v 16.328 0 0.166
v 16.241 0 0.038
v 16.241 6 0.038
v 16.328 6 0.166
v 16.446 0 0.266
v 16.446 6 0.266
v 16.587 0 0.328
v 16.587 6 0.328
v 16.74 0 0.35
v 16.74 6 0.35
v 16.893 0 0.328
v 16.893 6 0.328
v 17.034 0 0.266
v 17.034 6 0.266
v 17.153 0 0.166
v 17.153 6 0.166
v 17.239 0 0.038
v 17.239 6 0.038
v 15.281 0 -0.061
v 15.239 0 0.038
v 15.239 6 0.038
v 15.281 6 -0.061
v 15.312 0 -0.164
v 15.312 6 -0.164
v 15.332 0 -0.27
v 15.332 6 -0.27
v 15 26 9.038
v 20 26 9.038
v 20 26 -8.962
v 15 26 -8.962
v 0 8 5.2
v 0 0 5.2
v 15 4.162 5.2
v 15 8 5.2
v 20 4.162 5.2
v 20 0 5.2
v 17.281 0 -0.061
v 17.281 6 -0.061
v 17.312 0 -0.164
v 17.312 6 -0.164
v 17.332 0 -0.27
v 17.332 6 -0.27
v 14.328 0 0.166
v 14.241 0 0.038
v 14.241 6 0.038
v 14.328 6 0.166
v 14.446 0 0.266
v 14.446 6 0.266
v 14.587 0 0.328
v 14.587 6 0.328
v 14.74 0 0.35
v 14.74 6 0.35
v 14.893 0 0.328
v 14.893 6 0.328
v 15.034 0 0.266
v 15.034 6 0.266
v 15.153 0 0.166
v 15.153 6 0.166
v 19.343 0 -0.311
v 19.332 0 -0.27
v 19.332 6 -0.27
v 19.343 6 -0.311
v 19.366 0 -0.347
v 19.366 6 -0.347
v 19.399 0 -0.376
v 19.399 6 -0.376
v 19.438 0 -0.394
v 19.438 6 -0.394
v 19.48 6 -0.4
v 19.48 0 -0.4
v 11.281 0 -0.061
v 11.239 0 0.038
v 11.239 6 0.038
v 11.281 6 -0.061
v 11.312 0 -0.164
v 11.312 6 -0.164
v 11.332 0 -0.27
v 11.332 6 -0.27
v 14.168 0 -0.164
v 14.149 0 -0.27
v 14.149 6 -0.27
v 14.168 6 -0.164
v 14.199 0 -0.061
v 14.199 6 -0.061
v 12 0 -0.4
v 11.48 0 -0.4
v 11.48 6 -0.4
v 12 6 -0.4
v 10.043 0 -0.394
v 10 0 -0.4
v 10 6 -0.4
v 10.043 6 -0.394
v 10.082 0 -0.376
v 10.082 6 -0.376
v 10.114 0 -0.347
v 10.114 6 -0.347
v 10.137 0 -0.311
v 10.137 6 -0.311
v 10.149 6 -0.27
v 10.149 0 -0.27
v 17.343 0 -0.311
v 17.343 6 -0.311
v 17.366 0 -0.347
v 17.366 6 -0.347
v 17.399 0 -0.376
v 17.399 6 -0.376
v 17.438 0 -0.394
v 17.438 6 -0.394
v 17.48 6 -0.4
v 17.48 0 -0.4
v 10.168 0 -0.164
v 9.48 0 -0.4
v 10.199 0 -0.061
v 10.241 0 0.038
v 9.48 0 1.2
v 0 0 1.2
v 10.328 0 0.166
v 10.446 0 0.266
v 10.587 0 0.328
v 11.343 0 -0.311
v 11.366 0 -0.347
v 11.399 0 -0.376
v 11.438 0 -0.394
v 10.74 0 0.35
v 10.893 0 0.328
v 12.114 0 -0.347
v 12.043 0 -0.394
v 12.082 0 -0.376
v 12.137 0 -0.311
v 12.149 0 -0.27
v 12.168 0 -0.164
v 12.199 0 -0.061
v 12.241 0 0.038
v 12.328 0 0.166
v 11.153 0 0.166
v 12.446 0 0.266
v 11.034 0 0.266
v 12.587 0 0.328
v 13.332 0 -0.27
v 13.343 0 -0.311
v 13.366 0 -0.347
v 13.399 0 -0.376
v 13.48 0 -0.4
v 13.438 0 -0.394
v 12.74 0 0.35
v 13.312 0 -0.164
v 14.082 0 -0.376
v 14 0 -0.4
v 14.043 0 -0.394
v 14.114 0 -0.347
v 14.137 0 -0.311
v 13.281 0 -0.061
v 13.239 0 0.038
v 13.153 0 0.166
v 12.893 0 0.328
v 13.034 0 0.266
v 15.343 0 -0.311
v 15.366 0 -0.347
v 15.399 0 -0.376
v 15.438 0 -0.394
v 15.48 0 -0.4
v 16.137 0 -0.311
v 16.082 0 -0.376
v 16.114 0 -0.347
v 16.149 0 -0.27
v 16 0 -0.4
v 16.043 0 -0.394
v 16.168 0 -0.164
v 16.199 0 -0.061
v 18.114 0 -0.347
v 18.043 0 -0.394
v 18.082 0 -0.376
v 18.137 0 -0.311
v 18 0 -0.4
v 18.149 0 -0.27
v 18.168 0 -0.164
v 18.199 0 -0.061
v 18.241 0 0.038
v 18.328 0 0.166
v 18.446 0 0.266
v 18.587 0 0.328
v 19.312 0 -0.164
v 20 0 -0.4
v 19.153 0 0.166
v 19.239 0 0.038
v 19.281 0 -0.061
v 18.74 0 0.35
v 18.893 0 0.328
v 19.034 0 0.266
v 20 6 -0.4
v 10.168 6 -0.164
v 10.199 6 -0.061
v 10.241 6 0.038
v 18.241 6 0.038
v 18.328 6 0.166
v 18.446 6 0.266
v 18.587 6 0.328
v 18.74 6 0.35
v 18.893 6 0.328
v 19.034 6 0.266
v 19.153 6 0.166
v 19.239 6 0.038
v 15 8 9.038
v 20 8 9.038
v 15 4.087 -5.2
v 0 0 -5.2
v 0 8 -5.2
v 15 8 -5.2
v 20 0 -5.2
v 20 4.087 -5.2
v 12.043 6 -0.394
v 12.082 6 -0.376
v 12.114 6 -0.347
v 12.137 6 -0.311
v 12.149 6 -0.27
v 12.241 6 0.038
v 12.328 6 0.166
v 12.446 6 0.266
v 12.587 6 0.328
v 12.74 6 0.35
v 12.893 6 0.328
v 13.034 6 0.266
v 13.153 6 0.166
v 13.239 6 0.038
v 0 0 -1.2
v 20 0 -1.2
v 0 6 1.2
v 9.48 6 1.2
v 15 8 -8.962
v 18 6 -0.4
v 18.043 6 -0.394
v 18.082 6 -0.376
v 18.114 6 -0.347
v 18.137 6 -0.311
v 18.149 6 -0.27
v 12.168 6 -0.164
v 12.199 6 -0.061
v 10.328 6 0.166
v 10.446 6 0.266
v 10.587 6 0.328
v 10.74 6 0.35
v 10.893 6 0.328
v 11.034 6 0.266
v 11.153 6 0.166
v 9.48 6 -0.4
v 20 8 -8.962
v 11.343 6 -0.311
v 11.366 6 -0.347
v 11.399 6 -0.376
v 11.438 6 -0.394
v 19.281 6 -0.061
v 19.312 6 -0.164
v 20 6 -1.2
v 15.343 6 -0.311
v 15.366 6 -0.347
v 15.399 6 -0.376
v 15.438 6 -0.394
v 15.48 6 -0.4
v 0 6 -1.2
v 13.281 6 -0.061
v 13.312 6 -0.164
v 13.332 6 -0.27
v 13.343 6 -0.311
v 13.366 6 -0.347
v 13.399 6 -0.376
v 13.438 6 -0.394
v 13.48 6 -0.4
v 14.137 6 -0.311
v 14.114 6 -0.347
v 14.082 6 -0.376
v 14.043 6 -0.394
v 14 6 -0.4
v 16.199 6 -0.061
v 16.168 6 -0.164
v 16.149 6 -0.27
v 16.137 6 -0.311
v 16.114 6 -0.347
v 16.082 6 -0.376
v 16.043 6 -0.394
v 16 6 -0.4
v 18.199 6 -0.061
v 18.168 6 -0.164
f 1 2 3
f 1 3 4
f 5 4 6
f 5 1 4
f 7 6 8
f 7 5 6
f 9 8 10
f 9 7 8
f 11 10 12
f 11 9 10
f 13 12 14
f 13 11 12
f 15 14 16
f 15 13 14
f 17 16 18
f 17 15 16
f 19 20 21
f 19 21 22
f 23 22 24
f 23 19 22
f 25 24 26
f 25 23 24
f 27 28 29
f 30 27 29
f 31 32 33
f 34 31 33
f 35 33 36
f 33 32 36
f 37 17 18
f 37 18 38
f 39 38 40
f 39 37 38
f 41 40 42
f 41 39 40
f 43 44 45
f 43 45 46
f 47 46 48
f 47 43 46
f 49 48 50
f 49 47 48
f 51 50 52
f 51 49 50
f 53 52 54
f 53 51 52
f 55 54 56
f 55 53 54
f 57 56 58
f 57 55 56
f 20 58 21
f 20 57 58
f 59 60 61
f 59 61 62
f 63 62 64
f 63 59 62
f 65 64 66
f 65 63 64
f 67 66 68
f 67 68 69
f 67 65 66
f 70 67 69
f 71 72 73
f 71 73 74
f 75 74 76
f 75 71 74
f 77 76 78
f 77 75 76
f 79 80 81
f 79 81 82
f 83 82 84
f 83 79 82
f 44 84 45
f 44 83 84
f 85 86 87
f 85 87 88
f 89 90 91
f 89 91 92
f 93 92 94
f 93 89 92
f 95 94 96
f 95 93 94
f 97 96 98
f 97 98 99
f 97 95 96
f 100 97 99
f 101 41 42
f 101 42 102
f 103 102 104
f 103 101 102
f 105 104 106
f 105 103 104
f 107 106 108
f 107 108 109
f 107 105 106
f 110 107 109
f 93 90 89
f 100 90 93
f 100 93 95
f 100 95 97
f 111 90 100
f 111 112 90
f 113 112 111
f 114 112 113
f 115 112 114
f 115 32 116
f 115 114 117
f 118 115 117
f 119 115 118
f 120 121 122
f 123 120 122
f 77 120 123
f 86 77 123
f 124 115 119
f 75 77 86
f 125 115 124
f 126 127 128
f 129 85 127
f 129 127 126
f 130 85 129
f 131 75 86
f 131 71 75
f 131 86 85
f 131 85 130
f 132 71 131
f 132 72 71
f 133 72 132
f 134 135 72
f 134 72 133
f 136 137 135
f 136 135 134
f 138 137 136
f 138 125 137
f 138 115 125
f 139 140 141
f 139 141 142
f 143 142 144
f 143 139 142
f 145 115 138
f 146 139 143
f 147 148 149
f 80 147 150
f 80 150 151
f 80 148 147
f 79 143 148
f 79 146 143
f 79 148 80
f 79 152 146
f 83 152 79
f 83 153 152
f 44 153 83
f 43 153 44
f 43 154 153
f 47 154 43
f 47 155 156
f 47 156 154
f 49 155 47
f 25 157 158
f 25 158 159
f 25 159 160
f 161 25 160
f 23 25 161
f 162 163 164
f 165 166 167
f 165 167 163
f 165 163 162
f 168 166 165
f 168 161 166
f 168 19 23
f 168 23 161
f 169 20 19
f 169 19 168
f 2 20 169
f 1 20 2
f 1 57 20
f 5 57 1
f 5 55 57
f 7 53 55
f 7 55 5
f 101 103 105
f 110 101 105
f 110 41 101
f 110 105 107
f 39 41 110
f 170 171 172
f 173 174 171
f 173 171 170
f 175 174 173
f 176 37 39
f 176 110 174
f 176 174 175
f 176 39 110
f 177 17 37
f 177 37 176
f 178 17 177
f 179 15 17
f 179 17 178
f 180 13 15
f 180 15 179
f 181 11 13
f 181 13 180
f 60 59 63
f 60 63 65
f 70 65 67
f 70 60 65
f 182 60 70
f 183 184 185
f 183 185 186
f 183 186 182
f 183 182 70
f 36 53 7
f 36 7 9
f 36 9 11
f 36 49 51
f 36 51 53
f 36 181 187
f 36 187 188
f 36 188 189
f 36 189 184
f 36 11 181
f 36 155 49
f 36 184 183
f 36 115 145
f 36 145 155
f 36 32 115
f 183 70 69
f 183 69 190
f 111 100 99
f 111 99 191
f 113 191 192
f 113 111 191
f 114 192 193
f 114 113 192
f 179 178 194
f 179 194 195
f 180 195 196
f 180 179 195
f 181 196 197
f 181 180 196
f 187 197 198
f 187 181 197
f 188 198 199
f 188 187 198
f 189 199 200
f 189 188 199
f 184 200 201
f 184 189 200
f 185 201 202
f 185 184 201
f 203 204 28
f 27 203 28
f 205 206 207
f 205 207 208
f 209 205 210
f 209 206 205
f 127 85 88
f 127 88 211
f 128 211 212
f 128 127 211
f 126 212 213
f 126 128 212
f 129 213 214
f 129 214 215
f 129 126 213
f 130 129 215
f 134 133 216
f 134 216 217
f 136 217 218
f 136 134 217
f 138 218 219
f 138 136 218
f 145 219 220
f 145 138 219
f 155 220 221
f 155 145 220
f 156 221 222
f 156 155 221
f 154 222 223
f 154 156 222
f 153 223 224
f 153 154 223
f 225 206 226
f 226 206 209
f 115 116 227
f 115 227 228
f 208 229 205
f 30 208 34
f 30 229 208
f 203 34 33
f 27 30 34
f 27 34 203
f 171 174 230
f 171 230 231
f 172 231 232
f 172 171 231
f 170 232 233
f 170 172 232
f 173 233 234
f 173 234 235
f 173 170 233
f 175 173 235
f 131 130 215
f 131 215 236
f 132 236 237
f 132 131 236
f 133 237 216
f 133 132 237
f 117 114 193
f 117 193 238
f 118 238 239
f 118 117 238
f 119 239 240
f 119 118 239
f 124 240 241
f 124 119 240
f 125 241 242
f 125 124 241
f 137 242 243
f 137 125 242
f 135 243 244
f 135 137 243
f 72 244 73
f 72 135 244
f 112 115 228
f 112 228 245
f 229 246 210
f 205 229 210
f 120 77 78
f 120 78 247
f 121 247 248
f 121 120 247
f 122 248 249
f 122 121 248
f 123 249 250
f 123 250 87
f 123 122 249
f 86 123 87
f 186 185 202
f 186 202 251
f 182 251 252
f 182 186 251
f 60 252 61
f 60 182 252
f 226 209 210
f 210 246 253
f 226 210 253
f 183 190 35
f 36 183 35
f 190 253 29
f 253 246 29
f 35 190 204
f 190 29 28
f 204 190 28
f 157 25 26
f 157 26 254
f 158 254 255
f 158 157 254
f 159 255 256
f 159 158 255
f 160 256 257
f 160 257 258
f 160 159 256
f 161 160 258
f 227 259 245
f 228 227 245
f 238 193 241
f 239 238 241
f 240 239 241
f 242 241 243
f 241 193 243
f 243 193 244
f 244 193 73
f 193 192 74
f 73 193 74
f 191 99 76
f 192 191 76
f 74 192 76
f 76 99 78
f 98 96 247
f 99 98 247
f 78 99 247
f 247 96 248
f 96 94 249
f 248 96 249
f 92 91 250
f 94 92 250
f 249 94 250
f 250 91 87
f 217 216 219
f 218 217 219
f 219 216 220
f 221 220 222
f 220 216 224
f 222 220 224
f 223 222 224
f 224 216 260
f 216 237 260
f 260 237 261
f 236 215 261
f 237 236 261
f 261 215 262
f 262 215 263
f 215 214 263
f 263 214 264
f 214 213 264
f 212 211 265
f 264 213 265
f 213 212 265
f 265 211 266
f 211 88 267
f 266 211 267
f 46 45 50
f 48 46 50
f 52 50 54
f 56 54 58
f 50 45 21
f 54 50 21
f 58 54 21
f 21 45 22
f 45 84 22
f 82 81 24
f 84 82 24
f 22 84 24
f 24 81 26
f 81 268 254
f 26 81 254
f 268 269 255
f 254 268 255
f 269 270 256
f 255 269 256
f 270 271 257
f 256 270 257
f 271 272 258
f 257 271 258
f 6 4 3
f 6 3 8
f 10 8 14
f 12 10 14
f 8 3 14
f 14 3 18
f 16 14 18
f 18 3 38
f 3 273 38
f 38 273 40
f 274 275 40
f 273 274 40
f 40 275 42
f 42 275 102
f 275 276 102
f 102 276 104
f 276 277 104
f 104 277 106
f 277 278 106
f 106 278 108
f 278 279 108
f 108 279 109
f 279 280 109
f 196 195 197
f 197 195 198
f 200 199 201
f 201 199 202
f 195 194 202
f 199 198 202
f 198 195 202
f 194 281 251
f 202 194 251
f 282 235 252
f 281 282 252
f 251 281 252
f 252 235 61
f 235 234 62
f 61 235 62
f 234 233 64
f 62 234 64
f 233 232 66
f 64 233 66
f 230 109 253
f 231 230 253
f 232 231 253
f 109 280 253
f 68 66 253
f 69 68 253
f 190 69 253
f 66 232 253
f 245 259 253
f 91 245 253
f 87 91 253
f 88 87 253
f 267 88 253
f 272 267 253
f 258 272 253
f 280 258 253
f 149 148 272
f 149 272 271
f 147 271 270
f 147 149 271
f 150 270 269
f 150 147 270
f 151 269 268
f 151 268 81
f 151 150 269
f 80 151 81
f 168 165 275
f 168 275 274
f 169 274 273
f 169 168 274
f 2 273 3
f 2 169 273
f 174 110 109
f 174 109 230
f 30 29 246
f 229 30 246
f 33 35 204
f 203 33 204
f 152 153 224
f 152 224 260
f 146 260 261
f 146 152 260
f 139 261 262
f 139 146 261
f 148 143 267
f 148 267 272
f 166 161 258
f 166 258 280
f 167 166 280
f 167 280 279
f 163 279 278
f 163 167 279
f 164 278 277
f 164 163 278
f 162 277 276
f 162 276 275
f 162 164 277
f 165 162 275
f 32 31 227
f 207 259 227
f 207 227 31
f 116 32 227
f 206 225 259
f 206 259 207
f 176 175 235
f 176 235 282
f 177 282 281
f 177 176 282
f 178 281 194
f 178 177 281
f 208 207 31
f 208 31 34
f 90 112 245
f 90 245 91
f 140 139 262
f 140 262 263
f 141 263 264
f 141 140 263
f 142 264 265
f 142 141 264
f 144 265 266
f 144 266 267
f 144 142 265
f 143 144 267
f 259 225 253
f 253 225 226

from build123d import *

# Parameters (mm, degrees)
SKETCH1_W             = 20
SKETCH1_H             = 4
BOSS_EXTRUDE1_DEPTH   = 6
BOSS_EXTRUDE1_2_DEPTH = 6
BOSS_EXTRUDE2_DEPTH   = 6
LPATTERN1_COUNT       = 5
LPATTERN1_PITCH       = 2
SKETCH4_W             = 20
SKETCH4_H             = 10.4
BOSS_EXTRUDE3_DEPTH   = 2
BOSS_EXTRUDE4_DEPTH   = 5


with BuildPart() as part:
    # Sketch1 → Boss-Extrude1 (new body)
    with BuildSketch(Plane(origin=(0, 0, 0), x_dir=(1, 0, 0), z_dir=(0, 1, 0))):
        with Locations((10, 3.2)):
            Rectangle(SKETCH1_W, SKETCH1_H)
    extrude(amount=BOSS_EXTRUDE1_DEPTH)



with BuildPart() as body_2:
    # Sketch1 → Boss-Extrude1 2 (new body)
    with BuildSketch(Plane(origin=(0, 0, 0), x_dir=(1, 0, 0), z_dir=(0, 1, 0))):
        with Locations((10, -3.2)):
            Rectangle(SKETCH1_W, SKETCH1_H)
    extrude(amount=BOSS_EXTRUDE1_2_DEPTH)

    # Sketch3 → Boss-Extrude2 (add)
    with BuildSketch(Plane.XZ):
        with BuildLine():
            Line((17.48035085, -0.4), (18, -0.4))
            ThreePointArc((18, -0.4), (18.098907071, -0.362771412), (18.148718534, -0.269565217))
            ThreePointArc((18.148718534, -0.269565217), (18.182563711, -0.111937846), (18.241299021, 0.038202247))
            ThreePointArc((18.241299021, 0.038202247), (18.740175425, 0.35), (19.23905183, 0.038202247))
            ThreePointArc((19.23905183, 0.038202247), (19.297787139, -0.111937846), (19.331632316, -0.269565217))
            ThreePointArc((19.331632316, -0.269565217), (19.381443779, -0.362771412), (19.48035085, -0.4))
            Line((19.48035085, -0.4), (20, -0.4))
            Line((20, -0.4), (20, 1.2))
            Line((20, 1.2), (17.48035085, 1.2))
            Line((17.48035085, 1.2), (17.48035085, -0.4))
        make_face()
    boss_extrude2 = extrude(amount=-BOSS_EXTRUDE2_DEPTH)

    # LPattern1: Boss-Extrude2 ×5
    with Locations(*[(-i * LPATTERN1_PITCH, 0, 0) for i in range(1, LPATTERN1_COUNT)]):
        add(boss_extrude2)


with BuildPart() as part_1:
    add(part.part)

    add(body_2.part)  # Boss-Extrude3 merges body 2
    # Sketch4 → Boss-Extrude3 (add)
    with BuildSketch(Plane(origin=(0, 6, 0), x_dir=(1, 0, 0), z_dir=(0, 1, 0))):
        with Locations((10, 0)):
            Rectangle(SKETCH4_W, SKETCH4_H)
    extrude(amount=BOSS_EXTRUDE3_DEPTH)

    # Sketch5 → Boss-Extrude4 (add)
    with BuildSketch(Plane(origin=(20, 0, 0), x_dir=(0, 0, -1), z_dir=(1, 0, 0))):
        Polygon((-9.038202247, 26), (8.961797753, 26), (8.961797753, 8), (5.2, 4.08688479), (5.2, 8), (-5.2, 8), (-5.2, 4.161797753), (-9.038202247, 8), align=None)
    extrude(amount=-BOSS_EXTRUDE4_DEPTH)


solid = part_1.part
